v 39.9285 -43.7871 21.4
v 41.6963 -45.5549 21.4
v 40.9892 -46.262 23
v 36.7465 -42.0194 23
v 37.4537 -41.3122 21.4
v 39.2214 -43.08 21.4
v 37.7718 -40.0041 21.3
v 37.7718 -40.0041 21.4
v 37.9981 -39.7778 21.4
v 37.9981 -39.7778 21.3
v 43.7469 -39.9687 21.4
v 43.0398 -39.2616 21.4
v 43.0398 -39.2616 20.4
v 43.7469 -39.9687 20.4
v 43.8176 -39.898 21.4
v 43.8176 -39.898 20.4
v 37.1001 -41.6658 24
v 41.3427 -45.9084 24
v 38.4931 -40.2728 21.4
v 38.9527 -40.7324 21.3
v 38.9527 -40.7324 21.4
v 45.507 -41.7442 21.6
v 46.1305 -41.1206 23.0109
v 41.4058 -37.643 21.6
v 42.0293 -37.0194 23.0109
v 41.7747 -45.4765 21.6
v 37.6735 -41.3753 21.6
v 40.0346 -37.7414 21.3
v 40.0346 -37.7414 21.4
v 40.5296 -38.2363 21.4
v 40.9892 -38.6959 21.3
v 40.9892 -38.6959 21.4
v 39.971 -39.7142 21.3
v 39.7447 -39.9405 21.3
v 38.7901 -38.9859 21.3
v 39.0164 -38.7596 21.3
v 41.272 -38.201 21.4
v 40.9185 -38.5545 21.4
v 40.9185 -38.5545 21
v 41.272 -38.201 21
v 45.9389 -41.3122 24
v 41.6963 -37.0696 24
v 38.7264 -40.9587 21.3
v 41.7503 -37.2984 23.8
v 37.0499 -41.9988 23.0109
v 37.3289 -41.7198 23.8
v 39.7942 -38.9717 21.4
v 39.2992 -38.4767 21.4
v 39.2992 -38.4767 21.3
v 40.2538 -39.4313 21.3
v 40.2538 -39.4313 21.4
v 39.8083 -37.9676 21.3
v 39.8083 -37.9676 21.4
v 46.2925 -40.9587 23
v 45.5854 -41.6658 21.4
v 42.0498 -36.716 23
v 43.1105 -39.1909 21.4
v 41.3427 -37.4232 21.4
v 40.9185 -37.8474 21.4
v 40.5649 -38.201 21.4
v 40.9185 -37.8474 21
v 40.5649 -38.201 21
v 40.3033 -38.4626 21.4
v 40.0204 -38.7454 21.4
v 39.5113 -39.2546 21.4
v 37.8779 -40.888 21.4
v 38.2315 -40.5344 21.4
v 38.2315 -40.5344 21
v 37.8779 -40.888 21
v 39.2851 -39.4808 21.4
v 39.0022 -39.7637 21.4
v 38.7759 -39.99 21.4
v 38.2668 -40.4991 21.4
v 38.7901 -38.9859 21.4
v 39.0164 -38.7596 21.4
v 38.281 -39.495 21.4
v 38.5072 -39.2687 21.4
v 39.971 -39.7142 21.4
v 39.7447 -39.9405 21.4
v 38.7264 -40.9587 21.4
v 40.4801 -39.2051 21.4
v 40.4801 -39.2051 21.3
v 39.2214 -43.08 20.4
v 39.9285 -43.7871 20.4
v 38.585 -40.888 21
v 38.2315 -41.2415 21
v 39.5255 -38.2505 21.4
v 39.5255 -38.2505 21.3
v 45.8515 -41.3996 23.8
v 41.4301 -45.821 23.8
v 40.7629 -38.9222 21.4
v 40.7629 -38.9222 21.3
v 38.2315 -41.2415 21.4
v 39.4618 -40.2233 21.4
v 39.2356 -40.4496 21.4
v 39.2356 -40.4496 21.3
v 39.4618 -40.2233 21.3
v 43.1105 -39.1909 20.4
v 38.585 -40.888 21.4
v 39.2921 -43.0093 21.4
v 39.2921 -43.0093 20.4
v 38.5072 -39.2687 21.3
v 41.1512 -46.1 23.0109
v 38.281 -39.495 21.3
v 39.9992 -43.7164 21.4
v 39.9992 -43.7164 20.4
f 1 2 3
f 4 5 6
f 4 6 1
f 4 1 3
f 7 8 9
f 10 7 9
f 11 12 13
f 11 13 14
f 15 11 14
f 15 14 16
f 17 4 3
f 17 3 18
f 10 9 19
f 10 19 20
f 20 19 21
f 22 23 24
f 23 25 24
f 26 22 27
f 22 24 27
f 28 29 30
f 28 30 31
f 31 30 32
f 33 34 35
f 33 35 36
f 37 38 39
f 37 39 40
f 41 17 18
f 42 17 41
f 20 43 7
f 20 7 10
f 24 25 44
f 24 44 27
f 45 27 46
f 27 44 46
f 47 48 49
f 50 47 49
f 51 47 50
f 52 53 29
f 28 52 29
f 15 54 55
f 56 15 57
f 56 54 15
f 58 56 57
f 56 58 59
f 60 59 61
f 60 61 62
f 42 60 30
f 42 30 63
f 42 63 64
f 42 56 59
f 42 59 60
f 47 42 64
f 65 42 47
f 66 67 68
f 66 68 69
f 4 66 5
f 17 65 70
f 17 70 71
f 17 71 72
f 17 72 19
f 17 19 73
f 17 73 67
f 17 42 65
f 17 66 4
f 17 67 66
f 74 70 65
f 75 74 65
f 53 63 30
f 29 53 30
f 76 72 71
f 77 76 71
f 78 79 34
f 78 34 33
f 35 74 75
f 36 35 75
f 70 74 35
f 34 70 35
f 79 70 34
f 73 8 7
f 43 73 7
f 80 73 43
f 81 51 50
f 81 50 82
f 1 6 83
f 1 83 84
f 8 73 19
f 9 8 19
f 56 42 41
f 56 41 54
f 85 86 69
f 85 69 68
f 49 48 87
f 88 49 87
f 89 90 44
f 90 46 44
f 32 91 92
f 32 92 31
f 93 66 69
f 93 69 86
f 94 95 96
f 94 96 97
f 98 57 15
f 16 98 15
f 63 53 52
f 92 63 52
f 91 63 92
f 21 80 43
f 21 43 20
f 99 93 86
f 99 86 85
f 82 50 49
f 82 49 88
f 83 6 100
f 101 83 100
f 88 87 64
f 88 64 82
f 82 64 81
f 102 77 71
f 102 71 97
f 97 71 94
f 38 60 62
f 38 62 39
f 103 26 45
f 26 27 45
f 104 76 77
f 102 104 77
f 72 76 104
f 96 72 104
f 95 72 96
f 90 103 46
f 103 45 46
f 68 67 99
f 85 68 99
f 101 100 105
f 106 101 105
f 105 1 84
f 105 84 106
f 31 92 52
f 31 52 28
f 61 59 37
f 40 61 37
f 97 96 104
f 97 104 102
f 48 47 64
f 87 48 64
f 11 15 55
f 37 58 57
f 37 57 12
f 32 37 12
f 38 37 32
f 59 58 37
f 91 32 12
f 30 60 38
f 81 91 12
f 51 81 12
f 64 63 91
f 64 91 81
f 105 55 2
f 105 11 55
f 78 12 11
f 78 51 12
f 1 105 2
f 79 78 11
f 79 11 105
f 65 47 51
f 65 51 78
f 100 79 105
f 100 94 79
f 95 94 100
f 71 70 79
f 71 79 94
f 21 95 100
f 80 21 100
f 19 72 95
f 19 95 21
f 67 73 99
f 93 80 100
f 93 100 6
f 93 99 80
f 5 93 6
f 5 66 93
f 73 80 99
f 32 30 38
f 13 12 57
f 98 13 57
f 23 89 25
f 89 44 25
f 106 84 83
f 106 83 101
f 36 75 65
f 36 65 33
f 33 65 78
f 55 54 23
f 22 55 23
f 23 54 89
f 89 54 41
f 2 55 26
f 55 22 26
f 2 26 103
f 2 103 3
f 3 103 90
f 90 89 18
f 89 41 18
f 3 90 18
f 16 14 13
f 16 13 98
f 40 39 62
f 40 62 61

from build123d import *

# Parameters (mm, degrees)
PAD020_DEPTH            = 6
THICKNESS_T             = -0.2
SKETCH043_W             = 0.1
SKETCH043_H             = 1
PAD001_DEPTH            = 1
SKETCH044_W             = 0.5
SKETCH044_H             = 0.5
PAD002_DEPTH            = 0.4
SKETCH003_W             = 0.32
SKETCH003_H             = 1.35
PAD003_DEPTH            = 0.1
BODY001_ROLL_ANGLE      = 90.000024
BODY001_PITCH_ANGLE     = -1e-05
BODY001_PLACEMENT_ANGLE = 45.000049


with BuildPart() as part:
    # Sketch042 → Pad020 (new body)
    with BuildSketch(Plane.XY):
        Polygon((0, 0), (6.5, 0), (7, -1), (6, -2.6), (0.5, -2.6), (-0.5, -1), align=None)
    extrude(amount=PAD020_DEPTH)

    # Thickness
    thickness_openings = [part.faces().sort_by_distance(p)[0] for p in [
        (3.25, -1.25728, 6),
    ]]
    offset(amount=THICKNESS_T, openings=thickness_openings)

    # Sketch043 (on Face5 of Thickness) → Pad001 (join)
    with BuildSketch(Plane.XZ.offset(2.6)):
        with Locations((5.95, 3)):
            Rectangle(SKETCH043_W, SKETCH043_H)
        with Locations((0.55, 3)):
            Rectangle(SKETCH043_W, SKETCH043_H)
    extrude(amount=PAD001_DEPTH)

    # Sketch044 (on Face7 of Pad001) → Pad002 (join)
    with BuildSketch(Plane.XZ.offset(2.6)):
        with Locations((1.35, 0.25)):
            Rectangle(SKETCH044_W, SKETCH044_H)
        with Locations((5.15, 0.25)):
            Rectangle(SKETCH044_W, SKETCH044_H)
    extrude(amount=PAD002_DEPTH)

    # Sketch003 (on Face7 of Pad002) → Pad003 (join)
    with BuildSketch(Plane.XZ.offset(2.6)):
        with Locations((1.81, -0.025)):
            Rectangle(SKETCH003_W, SKETCH003_H)
        with Locations((2.53, -0.025)):
            Rectangle(SKETCH003_W, SKETCH003_H)
        with Locations((3.25, -0.025)):
            Rectangle(SKETCH003_W, SKETCH003_H)
        with Locations((3.97, -0.025)):
            Rectangle(SKETCH003_W, SKETCH003_H)
        with Locations((4.69, -0.025)):
            Rectangle(SKETCH003_W, SKETCH003_H)
    extrude(amount=PAD003_DEPTH)


with BuildPart() as part_1:
    # Body001 roll: moved
    add(part.part.rotate(Axis((0, 0, 0), (1, 0, 0)), BODY001_ROLL_ANGLE))


with BuildPart() as part_2:
    # Body001 pitch: moved
    add(part_1.part.rotate(Axis((0, 0, 0), (0, 1, 0)), BODY001_PITCH_ANGLE))


with BuildPart() as part_3:
    # Body001 placement: moved
    add(part_2.part.moved(Location((37.1001, -41.6658, 24))).rotate(Axis((37.1001, -41.6658, 24), (0, 0, 1)), BODY001_PLACEMENT_ANGLE))


solid = part_3.part
